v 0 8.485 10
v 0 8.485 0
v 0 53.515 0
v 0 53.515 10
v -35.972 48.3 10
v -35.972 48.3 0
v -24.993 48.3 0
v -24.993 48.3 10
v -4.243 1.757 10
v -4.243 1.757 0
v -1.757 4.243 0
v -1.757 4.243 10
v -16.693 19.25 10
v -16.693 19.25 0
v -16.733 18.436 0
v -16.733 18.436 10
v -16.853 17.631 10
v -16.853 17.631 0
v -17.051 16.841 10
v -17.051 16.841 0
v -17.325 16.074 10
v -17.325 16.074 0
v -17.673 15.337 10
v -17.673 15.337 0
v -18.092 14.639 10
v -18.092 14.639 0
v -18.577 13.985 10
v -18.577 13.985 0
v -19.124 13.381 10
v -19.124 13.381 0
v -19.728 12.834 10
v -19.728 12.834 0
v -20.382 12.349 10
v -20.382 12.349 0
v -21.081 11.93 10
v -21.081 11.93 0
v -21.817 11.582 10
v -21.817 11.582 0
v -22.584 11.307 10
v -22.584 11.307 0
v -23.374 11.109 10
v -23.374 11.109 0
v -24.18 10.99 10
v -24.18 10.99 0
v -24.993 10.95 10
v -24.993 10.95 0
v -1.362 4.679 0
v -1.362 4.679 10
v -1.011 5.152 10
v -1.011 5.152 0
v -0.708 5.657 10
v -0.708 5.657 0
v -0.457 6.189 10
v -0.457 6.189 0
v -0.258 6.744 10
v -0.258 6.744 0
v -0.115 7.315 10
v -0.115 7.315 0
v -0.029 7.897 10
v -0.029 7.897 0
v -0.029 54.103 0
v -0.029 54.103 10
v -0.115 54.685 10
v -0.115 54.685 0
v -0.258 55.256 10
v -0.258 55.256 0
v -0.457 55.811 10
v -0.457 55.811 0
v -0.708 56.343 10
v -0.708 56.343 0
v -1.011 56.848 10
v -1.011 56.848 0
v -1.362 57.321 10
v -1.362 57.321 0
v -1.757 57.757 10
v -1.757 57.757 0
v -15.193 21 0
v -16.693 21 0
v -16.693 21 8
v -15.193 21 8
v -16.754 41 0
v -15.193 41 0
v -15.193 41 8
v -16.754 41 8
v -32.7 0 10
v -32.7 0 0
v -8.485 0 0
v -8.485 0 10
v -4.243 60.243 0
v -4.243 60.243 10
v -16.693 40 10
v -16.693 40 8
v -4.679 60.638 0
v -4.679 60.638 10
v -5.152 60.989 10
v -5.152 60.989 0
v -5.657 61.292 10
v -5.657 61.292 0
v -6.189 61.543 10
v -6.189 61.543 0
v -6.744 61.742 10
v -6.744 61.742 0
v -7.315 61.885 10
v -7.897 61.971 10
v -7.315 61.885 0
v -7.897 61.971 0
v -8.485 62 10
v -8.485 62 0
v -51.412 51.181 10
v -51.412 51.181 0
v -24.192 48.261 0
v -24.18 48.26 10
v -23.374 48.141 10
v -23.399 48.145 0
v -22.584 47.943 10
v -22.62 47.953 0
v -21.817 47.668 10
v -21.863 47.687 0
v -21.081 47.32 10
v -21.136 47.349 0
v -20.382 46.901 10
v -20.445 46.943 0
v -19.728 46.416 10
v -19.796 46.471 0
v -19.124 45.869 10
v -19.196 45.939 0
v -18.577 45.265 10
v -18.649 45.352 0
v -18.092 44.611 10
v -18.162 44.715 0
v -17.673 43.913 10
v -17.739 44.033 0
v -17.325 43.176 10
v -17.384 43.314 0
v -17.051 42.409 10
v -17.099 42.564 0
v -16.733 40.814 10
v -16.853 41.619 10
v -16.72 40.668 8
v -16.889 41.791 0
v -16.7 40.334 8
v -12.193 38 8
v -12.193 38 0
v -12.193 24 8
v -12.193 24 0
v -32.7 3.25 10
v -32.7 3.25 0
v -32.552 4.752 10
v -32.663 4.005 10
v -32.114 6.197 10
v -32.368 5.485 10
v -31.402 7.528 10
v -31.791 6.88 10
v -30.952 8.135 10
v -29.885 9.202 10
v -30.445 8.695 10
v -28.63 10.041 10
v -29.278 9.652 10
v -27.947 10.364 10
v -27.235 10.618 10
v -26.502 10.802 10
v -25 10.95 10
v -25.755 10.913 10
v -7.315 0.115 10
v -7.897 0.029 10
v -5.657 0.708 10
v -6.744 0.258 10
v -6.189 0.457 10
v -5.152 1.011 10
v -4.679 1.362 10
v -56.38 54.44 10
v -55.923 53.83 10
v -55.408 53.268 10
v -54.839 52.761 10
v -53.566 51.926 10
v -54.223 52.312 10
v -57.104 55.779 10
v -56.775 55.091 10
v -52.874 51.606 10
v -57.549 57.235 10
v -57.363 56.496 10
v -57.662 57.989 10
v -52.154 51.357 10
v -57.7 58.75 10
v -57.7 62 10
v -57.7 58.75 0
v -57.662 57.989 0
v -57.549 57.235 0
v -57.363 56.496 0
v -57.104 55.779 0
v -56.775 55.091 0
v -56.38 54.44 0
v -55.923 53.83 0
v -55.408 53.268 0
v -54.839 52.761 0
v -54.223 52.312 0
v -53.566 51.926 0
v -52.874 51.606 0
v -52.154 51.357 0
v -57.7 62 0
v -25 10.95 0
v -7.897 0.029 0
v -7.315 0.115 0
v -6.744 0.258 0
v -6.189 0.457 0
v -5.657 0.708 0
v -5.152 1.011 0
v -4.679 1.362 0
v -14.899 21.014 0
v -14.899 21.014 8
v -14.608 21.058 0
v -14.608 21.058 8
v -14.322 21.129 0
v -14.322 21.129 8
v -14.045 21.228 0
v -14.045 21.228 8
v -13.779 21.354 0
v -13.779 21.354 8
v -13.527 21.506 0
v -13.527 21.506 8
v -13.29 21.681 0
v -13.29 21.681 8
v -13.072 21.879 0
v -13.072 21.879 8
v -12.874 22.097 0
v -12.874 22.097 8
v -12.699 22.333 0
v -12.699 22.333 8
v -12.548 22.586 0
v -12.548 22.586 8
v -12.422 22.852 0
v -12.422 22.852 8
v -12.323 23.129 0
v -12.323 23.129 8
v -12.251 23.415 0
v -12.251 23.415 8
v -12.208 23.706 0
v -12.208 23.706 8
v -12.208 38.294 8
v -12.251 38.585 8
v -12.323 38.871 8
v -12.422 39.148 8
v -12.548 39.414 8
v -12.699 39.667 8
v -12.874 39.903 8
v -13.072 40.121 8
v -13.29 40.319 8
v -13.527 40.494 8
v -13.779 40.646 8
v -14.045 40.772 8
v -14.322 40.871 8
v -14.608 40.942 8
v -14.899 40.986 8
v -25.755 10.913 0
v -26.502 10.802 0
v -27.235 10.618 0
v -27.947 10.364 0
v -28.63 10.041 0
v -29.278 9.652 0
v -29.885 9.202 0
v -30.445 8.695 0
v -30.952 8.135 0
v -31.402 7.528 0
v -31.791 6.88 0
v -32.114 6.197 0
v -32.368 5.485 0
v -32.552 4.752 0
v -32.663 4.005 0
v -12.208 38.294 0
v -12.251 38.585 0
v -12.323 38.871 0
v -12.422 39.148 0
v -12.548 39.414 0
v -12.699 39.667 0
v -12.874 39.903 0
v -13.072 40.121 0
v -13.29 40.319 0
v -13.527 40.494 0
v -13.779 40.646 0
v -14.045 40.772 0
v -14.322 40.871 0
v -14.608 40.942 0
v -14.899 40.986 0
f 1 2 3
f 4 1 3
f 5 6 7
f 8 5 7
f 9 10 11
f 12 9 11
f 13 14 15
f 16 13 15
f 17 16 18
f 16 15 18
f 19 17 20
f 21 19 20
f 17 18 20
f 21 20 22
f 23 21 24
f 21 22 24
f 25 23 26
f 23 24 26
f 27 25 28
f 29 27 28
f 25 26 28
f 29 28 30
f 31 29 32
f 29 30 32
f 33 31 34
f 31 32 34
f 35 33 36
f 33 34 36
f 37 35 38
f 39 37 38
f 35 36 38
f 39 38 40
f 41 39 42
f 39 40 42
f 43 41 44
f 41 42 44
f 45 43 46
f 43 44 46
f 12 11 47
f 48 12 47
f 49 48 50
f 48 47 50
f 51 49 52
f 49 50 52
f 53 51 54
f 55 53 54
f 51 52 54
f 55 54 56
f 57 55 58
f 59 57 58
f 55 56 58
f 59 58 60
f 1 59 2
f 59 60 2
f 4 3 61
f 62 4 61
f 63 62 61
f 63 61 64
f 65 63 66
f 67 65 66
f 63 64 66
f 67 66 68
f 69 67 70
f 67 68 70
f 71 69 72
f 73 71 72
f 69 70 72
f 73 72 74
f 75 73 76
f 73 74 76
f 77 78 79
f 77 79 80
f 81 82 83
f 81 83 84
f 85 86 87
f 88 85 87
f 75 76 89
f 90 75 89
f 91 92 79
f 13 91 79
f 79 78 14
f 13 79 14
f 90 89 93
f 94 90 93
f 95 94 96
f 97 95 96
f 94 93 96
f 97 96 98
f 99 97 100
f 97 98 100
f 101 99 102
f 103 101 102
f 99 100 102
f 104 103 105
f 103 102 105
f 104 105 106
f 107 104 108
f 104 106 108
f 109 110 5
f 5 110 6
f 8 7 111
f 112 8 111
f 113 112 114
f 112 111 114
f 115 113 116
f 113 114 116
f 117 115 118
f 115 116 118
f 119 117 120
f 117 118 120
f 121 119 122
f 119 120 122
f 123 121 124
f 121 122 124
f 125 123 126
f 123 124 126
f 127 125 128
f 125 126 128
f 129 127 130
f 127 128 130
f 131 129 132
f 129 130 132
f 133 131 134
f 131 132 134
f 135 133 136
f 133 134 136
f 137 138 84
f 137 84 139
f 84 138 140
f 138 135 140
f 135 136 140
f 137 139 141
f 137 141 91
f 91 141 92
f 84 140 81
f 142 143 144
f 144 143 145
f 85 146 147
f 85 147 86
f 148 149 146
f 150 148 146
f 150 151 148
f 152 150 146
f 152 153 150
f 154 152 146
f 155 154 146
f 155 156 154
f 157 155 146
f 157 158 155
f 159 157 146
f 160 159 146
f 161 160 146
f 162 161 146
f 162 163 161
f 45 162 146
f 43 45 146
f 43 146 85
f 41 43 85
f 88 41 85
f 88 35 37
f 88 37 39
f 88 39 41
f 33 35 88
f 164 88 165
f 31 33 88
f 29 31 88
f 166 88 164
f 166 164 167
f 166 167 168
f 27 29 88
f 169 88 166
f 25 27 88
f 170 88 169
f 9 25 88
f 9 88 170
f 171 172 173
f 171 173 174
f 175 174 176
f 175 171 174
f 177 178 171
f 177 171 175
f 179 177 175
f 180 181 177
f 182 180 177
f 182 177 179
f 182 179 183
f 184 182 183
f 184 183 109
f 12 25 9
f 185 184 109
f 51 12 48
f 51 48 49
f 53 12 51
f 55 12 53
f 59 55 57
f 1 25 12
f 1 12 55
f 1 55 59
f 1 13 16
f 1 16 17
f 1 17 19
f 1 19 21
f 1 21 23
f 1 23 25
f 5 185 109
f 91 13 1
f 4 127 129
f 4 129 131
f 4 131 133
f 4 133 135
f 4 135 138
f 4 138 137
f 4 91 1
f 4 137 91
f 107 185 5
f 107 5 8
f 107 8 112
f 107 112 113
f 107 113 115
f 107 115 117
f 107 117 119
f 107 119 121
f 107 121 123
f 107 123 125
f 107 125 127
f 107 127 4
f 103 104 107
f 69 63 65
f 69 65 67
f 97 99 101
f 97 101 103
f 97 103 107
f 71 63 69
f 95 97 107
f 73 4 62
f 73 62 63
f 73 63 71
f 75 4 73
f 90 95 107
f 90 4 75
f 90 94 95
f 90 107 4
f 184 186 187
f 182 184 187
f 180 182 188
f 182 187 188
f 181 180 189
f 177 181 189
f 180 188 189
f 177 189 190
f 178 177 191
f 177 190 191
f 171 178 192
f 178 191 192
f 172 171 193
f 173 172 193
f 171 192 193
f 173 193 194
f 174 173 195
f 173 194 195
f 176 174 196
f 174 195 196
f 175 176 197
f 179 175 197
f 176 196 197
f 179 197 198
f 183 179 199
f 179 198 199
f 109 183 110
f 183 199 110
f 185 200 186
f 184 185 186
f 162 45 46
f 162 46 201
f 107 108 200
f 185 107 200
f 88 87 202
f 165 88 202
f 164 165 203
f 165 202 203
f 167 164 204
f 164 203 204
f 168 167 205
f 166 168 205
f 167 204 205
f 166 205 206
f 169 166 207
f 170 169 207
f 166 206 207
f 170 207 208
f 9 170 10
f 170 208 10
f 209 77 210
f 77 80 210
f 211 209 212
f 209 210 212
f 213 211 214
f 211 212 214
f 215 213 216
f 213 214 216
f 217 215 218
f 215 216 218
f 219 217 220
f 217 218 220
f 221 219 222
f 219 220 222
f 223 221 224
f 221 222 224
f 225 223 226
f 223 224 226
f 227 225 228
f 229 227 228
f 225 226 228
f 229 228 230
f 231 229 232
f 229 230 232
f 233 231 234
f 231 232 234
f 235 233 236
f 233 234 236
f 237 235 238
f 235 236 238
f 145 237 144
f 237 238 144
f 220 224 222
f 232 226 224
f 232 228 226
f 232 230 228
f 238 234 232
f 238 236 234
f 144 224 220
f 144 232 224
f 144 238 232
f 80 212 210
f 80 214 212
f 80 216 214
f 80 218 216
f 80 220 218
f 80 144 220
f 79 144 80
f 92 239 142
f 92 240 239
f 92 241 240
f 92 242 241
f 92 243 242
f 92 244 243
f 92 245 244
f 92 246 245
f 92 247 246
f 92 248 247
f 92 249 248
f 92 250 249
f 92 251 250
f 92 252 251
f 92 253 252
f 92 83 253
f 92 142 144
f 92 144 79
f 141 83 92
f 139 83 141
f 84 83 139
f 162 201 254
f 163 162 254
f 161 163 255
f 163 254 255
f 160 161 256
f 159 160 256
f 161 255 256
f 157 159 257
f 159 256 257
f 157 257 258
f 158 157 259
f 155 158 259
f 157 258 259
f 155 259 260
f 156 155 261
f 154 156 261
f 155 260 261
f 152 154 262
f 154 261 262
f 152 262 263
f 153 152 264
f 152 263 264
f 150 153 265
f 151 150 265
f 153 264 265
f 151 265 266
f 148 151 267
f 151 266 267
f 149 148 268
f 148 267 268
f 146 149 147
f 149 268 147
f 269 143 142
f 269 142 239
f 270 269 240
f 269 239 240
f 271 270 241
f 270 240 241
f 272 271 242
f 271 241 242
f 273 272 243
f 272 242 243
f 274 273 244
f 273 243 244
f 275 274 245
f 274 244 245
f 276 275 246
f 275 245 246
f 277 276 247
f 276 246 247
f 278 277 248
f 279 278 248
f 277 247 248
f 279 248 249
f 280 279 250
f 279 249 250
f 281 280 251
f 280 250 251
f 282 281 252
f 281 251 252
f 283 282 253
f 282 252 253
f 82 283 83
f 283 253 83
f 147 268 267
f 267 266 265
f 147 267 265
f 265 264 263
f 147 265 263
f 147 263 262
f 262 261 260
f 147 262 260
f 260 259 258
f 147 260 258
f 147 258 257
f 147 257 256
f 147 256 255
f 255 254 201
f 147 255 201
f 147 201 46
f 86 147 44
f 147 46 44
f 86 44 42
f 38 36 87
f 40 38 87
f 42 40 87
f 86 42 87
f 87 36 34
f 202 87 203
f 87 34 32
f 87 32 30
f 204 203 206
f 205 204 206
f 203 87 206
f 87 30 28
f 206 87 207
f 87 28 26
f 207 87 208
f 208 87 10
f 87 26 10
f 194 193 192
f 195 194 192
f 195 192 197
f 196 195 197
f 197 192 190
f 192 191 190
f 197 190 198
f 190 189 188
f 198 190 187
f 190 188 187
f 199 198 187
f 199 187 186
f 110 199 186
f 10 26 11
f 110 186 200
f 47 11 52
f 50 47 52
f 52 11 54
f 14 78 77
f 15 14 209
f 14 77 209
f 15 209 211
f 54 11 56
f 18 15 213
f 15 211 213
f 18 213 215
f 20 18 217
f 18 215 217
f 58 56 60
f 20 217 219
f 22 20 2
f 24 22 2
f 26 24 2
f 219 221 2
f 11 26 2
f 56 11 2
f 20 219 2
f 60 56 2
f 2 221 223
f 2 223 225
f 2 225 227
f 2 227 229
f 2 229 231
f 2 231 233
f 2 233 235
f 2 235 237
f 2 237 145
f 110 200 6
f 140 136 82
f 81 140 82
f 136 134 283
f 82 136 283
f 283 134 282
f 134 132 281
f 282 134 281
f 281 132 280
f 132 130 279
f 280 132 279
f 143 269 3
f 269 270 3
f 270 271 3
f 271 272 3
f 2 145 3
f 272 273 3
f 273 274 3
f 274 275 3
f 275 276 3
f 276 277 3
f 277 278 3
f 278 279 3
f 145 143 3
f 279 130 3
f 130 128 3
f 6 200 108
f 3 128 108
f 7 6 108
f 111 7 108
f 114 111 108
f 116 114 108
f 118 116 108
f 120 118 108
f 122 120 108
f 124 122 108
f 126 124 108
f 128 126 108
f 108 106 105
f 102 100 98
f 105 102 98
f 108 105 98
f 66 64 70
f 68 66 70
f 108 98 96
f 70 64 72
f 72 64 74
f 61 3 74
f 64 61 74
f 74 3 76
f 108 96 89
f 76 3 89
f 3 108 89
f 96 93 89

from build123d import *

# Parameters (mm, degrees)
RESSALTO_EXTRUS_O1_DEPTH = 10
CORTE_EXTRUS_O1_START    = -10
CORTE_EXTRUS_O1_DEPTH    = 8
FILETE1_R                = 3


with BuildPart() as part:
    # Esboço1 → Ressalto-extrusão1 (new body)
    with BuildSketch(Plane.XY):
        with BuildLine():
            Line((0, 8.485281374), (0, 53.514718626))
            ThreePointArc((0, 53.514718626), (-0.456722805, 55.81081922), (-1.757359313, 57.757359313))
            Line((-1.757359313, 57.757359313), (-4.242640687, 60.242640687))
            ThreePointArc((-4.242640687, 60.242640687), (-6.18918078, 61.543277195), (-8.485281374, 62))
            Line((-8.485281374, 62), (-57.7, 62))
            Line((-57.7, 62), (-57.7, 58.75))
            ThreePointArc((-57.7, 58.75), (-55.923006732, 53.82983829), (-51.412210065, 51.180610148))
            Line((-51.412210065, 51.180610148), (-35.972254096, 48.3))
            Line((-35.972254096, 48.3), (-24.993325909, 48.3))
            ThreePointArc((-24.993325909, 48.3), (-19.124339626, 45.868986284), (-16.693325909, 40))
            Line((-16.693325909, 40), (-16.693325909, 19.25))
            ThreePointArc((-16.693325909, 19.25), (-19.124339626, 13.381013716), (-24.993325909, 10.95))
            Line((-24.993325909, 10.95), (-25, 10.95))
            ThreePointArc((-25, 10.95), (-30.444722215, 8.694722215), (-32.7, 3.25))
            Line((-32.7, 3.25), (-32.7, 0))
            Line((-32.7, 0), (-8.485281374, 0))
            ThreePointArc((-8.485281374, 0), (-6.18918078, 0.456722805), (-4.242640687, 1.757359313))
            Line((-4.242640687, 1.757359313), (-1.757359313, 4.242640687))
            ThreePointArc((-1.757359313, 4.242640687), (-0.456722805, 6.18918078), (0, 8.485281374))
        make_face()
    extrude(amount=RESSALTO_EXTRUS_O1_DEPTH)

    # Esboço3 → Corte-extrusão1 (cut)
    with BuildSketch(Plane.XY.offset(10).offset(CORTE_EXTRUS_O1_START)):
        Polygon((-16.693325909, 41), (-12.193325909, 41), (-12.193325909, 21), (-16.693325909, 21), (-18.193325909, 21), (-18.193325909, 41), align=None)
    extrude(amount=CORTE_EXTRUS_O1_DEPTH, mode=Mode.SUBTRACT)

    # Filete1
    filete1_edges = [part.edges().sort_by_distance(p)[0] for p in [
        (-12.193325909, 21, 4),
        (-12.193325909, 41, 4),
    ]]
    fillet(filete1_edges, radius=FILETE1_R)


solid = part.part
